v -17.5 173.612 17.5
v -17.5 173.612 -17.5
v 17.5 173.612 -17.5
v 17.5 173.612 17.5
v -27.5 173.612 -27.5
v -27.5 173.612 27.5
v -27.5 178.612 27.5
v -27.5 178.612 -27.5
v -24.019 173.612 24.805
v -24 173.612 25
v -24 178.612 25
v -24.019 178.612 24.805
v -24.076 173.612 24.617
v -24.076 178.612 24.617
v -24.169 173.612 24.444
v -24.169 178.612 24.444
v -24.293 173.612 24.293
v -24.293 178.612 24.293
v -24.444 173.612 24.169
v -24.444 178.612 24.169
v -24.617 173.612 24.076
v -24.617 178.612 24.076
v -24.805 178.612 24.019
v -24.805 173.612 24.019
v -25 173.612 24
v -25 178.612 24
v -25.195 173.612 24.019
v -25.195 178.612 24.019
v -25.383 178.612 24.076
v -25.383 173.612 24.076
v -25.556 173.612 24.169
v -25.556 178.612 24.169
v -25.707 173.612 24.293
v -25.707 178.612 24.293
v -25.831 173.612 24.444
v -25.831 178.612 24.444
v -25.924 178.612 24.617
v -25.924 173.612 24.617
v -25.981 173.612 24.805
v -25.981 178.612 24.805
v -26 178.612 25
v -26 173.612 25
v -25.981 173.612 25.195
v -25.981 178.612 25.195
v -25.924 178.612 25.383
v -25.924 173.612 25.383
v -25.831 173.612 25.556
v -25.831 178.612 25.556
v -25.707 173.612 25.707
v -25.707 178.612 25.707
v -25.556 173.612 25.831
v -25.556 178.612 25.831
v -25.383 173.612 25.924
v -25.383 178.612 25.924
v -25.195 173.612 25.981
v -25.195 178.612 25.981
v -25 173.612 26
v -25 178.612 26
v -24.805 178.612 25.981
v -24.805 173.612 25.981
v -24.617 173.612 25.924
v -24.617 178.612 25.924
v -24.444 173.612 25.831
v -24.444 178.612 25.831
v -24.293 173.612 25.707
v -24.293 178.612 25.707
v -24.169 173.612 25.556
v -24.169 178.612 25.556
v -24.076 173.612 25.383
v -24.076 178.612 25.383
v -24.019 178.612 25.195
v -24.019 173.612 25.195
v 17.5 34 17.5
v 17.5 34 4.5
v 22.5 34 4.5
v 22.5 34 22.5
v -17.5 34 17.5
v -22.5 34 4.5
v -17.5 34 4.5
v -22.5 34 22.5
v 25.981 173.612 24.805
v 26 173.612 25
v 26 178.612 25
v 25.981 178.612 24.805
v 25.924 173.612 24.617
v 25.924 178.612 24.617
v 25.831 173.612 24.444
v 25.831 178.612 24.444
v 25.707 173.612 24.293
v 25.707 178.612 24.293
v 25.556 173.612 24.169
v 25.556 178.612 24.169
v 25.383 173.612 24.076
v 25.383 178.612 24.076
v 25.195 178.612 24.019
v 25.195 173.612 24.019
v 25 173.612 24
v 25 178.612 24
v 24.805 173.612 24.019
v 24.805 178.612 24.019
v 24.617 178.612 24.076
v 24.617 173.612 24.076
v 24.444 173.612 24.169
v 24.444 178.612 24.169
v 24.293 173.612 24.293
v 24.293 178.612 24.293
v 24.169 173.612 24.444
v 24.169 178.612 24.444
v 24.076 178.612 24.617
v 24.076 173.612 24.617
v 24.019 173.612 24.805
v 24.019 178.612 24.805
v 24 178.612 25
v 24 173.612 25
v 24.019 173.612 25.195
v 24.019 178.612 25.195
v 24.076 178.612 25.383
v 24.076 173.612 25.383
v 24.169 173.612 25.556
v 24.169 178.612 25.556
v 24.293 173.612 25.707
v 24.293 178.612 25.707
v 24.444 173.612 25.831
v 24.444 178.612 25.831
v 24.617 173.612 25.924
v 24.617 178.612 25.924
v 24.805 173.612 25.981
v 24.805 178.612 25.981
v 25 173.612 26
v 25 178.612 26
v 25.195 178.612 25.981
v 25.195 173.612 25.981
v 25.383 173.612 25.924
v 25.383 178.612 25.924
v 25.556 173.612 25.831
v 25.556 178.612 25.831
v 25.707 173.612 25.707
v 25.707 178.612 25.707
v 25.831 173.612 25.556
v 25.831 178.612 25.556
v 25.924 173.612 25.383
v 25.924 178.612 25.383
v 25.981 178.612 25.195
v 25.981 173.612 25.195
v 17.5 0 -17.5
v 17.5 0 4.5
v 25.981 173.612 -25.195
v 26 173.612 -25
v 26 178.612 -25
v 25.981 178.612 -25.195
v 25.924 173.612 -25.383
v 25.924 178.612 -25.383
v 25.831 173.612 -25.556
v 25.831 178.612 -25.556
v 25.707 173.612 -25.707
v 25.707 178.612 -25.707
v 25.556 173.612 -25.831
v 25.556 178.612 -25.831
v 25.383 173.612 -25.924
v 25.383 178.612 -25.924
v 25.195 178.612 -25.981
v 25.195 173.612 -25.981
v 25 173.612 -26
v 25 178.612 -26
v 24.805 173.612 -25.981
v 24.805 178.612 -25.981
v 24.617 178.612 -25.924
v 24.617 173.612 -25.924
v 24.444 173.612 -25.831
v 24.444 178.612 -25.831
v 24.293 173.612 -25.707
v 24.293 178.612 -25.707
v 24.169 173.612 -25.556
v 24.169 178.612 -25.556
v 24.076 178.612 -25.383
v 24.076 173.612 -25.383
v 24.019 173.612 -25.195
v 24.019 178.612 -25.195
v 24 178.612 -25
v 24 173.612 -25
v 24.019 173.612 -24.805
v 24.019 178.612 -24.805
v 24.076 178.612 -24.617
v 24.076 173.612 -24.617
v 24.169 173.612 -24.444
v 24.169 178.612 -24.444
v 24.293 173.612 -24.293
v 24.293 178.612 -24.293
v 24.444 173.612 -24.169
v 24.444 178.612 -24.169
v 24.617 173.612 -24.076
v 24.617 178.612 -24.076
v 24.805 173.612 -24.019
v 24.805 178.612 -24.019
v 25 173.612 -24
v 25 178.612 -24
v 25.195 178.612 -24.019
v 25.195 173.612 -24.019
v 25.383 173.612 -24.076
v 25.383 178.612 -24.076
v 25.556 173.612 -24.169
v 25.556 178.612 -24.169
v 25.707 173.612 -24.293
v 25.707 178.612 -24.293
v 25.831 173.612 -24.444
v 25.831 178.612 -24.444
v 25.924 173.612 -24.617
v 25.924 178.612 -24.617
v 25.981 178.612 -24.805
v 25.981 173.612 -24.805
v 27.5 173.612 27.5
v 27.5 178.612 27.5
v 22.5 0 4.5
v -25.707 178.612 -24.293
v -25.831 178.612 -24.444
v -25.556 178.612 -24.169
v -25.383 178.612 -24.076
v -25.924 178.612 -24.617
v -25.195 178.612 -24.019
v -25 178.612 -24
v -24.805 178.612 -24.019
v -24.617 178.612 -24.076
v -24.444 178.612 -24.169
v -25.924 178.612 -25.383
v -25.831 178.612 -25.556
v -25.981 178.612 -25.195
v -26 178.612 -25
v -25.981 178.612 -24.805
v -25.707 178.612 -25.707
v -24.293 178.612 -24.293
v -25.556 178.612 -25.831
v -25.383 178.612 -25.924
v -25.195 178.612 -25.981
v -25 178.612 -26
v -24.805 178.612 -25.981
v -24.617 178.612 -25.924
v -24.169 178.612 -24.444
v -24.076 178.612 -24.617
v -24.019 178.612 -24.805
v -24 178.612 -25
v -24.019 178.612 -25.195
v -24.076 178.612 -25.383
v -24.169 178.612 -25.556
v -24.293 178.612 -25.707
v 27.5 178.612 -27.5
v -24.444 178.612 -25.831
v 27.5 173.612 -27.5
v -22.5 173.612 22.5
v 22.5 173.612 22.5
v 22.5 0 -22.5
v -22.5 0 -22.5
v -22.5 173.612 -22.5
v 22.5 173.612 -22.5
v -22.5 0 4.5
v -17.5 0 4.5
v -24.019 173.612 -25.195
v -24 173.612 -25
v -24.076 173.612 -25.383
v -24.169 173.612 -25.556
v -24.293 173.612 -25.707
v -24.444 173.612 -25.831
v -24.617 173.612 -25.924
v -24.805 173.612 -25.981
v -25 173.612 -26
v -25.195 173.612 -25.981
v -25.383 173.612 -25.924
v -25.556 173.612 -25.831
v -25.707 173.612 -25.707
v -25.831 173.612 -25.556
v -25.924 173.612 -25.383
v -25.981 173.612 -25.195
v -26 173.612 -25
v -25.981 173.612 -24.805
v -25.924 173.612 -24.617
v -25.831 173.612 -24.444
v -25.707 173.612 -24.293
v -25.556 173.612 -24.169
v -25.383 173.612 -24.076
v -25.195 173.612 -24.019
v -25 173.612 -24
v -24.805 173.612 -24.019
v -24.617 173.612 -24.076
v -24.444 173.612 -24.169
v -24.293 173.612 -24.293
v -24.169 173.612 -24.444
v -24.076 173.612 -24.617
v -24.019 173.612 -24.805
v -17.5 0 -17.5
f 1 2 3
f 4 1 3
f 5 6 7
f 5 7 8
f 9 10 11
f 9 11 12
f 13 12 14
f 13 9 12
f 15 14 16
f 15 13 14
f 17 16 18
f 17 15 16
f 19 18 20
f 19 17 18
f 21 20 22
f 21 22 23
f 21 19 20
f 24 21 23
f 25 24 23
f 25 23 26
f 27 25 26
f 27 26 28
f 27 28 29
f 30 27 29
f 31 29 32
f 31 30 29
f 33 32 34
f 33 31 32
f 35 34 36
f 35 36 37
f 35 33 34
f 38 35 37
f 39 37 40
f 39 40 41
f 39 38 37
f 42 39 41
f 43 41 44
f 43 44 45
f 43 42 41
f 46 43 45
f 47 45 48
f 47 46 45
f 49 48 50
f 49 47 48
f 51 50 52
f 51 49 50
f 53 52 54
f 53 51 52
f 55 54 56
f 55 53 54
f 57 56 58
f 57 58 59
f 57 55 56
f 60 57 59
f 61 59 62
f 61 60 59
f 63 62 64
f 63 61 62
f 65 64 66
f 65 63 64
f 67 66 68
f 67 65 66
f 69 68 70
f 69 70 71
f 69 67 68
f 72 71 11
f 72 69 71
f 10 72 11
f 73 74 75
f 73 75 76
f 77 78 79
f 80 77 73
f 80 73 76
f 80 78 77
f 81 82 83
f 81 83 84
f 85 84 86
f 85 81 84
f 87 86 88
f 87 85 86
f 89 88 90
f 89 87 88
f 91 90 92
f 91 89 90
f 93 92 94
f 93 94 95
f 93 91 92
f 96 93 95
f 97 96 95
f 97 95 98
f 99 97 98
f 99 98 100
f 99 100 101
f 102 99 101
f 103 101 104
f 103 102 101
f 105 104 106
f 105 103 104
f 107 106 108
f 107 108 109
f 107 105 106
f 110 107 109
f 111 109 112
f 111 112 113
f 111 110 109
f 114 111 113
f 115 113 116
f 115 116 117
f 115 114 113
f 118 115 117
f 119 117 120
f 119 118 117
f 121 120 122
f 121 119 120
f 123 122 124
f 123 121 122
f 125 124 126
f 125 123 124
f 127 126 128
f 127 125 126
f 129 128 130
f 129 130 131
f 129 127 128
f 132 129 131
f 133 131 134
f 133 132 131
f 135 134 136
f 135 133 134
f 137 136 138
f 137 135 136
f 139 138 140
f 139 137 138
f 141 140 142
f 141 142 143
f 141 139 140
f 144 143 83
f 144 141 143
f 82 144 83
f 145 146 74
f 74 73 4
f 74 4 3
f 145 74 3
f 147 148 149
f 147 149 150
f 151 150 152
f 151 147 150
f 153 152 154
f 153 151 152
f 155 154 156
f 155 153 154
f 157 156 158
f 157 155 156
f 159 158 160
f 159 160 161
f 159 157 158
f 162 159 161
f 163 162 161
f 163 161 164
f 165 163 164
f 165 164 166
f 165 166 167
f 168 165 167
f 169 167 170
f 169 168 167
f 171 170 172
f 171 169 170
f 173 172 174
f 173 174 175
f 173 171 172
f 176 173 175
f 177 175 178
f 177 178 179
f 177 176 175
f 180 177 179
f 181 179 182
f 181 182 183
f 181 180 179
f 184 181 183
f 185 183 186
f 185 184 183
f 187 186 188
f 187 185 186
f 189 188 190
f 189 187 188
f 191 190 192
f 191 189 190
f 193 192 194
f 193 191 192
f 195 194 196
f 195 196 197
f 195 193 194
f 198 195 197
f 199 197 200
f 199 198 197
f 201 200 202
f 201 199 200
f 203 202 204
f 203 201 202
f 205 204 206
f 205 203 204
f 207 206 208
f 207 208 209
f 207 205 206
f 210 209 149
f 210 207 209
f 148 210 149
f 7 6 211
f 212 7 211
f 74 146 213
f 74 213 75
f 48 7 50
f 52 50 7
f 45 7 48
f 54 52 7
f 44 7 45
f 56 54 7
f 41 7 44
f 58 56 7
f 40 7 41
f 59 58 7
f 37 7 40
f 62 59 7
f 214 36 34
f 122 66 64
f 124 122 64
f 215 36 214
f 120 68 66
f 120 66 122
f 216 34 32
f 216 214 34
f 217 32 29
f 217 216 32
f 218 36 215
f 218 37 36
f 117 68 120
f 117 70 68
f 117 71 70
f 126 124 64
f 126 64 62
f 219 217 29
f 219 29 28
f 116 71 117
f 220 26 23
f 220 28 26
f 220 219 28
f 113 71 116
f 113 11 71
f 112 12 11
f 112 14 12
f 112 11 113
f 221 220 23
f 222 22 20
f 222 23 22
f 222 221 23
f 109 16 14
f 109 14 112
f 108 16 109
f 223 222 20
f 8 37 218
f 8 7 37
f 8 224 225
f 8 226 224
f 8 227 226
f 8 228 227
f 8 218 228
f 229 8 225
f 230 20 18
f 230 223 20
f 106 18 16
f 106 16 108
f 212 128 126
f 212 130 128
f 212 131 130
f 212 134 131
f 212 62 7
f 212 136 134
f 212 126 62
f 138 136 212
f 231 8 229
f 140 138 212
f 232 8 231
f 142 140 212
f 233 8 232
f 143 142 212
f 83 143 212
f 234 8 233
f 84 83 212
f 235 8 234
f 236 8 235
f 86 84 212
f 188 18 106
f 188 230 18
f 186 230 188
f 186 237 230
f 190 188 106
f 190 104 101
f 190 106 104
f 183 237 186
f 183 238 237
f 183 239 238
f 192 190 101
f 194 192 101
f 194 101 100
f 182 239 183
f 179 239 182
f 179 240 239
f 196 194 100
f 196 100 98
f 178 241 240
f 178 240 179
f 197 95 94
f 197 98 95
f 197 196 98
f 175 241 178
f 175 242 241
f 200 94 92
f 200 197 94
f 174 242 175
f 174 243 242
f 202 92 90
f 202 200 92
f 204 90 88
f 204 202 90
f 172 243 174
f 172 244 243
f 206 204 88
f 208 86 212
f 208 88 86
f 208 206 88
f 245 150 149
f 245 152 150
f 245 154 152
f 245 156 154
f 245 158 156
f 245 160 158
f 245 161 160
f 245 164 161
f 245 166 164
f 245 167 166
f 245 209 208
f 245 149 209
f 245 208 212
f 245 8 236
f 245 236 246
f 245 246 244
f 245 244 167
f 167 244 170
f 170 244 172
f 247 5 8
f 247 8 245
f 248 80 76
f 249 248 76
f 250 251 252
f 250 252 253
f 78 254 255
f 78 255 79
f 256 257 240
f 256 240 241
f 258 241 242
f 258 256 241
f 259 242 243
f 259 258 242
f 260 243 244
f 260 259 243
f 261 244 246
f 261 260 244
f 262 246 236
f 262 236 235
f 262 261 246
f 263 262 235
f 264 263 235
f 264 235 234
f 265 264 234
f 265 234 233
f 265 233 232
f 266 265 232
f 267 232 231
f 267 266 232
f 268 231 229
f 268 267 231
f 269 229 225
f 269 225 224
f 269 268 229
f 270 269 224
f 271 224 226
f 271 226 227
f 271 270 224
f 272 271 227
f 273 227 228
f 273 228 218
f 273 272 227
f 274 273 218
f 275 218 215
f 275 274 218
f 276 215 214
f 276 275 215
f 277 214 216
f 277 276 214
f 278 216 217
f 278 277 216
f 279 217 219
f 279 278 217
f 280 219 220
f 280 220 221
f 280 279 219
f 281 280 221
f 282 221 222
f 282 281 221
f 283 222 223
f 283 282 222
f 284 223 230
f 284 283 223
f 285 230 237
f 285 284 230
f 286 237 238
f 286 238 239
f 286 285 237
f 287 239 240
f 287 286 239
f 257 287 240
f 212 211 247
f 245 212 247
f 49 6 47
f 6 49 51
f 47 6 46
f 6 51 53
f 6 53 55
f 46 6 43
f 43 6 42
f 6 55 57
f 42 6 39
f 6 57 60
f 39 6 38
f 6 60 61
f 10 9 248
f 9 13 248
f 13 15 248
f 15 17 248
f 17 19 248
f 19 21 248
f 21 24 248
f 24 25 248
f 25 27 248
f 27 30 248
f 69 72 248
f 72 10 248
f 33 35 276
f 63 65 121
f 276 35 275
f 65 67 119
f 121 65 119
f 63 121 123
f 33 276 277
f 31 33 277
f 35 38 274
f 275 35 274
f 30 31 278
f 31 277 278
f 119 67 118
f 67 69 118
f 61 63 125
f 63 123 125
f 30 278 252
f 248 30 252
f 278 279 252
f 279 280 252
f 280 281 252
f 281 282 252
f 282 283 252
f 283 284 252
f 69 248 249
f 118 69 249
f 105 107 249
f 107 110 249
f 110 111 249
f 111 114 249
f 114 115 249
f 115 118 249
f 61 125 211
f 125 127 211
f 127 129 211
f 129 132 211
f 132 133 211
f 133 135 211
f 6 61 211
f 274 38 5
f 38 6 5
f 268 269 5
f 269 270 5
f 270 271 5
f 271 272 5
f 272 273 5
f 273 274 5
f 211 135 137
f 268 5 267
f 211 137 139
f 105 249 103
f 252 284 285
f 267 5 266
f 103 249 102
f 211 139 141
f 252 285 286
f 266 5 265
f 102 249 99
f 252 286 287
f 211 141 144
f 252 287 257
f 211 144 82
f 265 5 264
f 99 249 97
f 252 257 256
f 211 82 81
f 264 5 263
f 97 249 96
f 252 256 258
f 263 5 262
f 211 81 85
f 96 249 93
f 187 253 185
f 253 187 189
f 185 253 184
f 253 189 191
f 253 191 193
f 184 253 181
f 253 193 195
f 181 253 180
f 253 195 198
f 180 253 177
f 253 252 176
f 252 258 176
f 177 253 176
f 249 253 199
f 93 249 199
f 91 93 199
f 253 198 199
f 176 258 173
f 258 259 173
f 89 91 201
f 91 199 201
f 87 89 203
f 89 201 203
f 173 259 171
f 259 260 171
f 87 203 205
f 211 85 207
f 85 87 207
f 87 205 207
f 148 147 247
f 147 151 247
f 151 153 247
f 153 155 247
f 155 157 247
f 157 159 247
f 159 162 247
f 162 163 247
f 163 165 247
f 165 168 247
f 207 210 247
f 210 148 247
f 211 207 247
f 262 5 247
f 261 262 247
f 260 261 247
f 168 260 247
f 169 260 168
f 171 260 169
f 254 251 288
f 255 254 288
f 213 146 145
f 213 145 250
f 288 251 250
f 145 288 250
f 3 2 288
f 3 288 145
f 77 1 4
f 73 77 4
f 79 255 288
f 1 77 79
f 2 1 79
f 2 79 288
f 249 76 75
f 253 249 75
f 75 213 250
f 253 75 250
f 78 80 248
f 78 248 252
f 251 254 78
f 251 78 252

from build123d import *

# Parameters (mm, degrees)
CROQUIS1_W                 = 45
CROQUIS1_H                 = 45
SALIENTE_EXTRUIR1_DEPTH    = 300
CROQUIS4_W                 = 18
CROQUIS4_H                 = 34
CORTAR_EXTRUIR2_DEPTH      = 46
CROQUIS8_W                 = 35
CROQUIS8_H                 = 35
CORTAR_EXTRUIR3_DEPTH      = 301
CROQUIS9_W                 = 35
CROQUIS9_H                 = 21.174410022
CORTAR_EXTRUIR4_DEPTH      = 10
CROQUIS10_R                = 1
CORTAR_EXTRUIR5_DEPTH      = 10
CROQUIS11_W                = 45
CROQUIS11_H                = 26.387879272
CORTAR_EXTRUIR6_DEPTH      = 46
CROQUIS13_W                = 45
CROQUIS13_H                = 100
CORTAR_EXTRUIR9_DEPTH      = 23.5
CORTAR_EXTRUIR9_DEPTH_BACK = 23.5
CROQUIS14_W                = 55
CROQUIS14_H                = 55
CROQUIS14_R                = 1
SALIENTE_EXTRUIR3_DEPTH    = 5


with BuildPart() as part:
    # Croquis1 → Saliente-Extruir1 (new body)
    with BuildSketch(Plane(origin=(0, 0, 0), x_dir=(1, 0, 0), z_dir=(0, 1, 0))):
        Rectangle(CROQUIS1_W, CROQUIS1_H)
    extrude(amount=SALIENTE_EXTRUIR1_DEPTH)

    # Croquis4 → Cortar-Extruir2 (cut, through all)
    with BuildSketch(Plane.ZY.offset(22.5)):
        with Locations((13.5, 17)):
            Rectangle(CROQUIS4_W, CROQUIS4_H)
    extrude(amount=-CORTAR_EXTRUIR2_DEPTH, mode=Mode.SUBTRACT)

    # Croquis8 → Cortar-Extruir3 (cut, through all)
    with BuildSketch(Plane(origin=(0, 300, 0), x_dir=(1, 0, 0), z_dir=(0, 1, 0))):
        Rectangle(CROQUIS8_W, CROQUIS8_H)
    extrude(amount=-CORTAR_EXTRUIR3_DEPTH, mode=Mode.SUBTRACT)

    # Croquis9 → Cortar-Extruir4 (cut)
    with BuildSketch(Plane(origin=(0, 0, -22.5), x_dir=(-1, 0, 0), z_dir=(0, 0, -1))):
        with Locations((0, 260)):
            Rectangle(CROQUIS9_W, CROQUIS9_H)
    extrude(amount=-CORTAR_EXTRUIR4_DEPTH, mode=Mode.SUBTRACT)

    # Croquis10 → Cortar-Extruir5 (cut)
    with BuildSketch(Plane.XY.offset(22.5)):
        with Locations((0, 260)):
            Circle(CROQUIS10_R)
    extrude(amount=-CORTAR_EXTRUIR5_DEPTH, mode=Mode.SUBTRACT)

    # Croquis11 → Cortar-Extruir6 (cut, through all)
    with BuildSketch(Plane.XY.offset(22.5)):
        with Locations((0, 286.806060364)):
            Rectangle(CROQUIS11_W, CROQUIS11_H)
    extrude(amount=-CORTAR_EXTRUIR6_DEPTH, mode=Mode.SUBTRACT)

    # Croquis13 → Cortar-Extruir9 (cut, two sides)
    with BuildSketch(Plane(origin=(0, 0, 0), x_dir=(0, 0, -1), z_dir=(1, 0, 0))) as cortar_extruir9_sk:
        with Locations((0, 223.612120728)):
            Rectangle(CROQUIS13_W, CROQUIS13_H)
    extrude(amount=CORTAR_EXTRUIR9_DEPTH, mode=Mode.SUBTRACT)
    extrude(cortar_extruir9_sk.sketch, amount=-CORTAR_EXTRUIR9_DEPTH_BACK, mode=Mode.SUBTRACT)

    # Croquis14 → Saliente-Extruir3 (add)
    with BuildSketch(Plane(origin=(0, 173.612120728, 0), x_dir=(1, 0, 0), z_dir=(0, 1, 0))):
        Rectangle(CROQUIS14_W, CROQUIS14_H)
        with Locations((-25, 25)):
            Circle(CROQUIS14_R, mode=Mode.SUBTRACT)
        with Locations((25, -25)):
            Circle(CROQUIS14_R, mode=Mode.SUBTRACT)
        with Locations((25, 25)):
            Circle(CROQUIS14_R, mode=Mode.SUBTRACT)
        with Locations((-25, -25)):
            Circle(CROQUIS14_R, mode=Mode.SUBTRACT)
    extrude(amount=SALIENTE_EXTRUIR3_DEPTH)


solid = part.part
